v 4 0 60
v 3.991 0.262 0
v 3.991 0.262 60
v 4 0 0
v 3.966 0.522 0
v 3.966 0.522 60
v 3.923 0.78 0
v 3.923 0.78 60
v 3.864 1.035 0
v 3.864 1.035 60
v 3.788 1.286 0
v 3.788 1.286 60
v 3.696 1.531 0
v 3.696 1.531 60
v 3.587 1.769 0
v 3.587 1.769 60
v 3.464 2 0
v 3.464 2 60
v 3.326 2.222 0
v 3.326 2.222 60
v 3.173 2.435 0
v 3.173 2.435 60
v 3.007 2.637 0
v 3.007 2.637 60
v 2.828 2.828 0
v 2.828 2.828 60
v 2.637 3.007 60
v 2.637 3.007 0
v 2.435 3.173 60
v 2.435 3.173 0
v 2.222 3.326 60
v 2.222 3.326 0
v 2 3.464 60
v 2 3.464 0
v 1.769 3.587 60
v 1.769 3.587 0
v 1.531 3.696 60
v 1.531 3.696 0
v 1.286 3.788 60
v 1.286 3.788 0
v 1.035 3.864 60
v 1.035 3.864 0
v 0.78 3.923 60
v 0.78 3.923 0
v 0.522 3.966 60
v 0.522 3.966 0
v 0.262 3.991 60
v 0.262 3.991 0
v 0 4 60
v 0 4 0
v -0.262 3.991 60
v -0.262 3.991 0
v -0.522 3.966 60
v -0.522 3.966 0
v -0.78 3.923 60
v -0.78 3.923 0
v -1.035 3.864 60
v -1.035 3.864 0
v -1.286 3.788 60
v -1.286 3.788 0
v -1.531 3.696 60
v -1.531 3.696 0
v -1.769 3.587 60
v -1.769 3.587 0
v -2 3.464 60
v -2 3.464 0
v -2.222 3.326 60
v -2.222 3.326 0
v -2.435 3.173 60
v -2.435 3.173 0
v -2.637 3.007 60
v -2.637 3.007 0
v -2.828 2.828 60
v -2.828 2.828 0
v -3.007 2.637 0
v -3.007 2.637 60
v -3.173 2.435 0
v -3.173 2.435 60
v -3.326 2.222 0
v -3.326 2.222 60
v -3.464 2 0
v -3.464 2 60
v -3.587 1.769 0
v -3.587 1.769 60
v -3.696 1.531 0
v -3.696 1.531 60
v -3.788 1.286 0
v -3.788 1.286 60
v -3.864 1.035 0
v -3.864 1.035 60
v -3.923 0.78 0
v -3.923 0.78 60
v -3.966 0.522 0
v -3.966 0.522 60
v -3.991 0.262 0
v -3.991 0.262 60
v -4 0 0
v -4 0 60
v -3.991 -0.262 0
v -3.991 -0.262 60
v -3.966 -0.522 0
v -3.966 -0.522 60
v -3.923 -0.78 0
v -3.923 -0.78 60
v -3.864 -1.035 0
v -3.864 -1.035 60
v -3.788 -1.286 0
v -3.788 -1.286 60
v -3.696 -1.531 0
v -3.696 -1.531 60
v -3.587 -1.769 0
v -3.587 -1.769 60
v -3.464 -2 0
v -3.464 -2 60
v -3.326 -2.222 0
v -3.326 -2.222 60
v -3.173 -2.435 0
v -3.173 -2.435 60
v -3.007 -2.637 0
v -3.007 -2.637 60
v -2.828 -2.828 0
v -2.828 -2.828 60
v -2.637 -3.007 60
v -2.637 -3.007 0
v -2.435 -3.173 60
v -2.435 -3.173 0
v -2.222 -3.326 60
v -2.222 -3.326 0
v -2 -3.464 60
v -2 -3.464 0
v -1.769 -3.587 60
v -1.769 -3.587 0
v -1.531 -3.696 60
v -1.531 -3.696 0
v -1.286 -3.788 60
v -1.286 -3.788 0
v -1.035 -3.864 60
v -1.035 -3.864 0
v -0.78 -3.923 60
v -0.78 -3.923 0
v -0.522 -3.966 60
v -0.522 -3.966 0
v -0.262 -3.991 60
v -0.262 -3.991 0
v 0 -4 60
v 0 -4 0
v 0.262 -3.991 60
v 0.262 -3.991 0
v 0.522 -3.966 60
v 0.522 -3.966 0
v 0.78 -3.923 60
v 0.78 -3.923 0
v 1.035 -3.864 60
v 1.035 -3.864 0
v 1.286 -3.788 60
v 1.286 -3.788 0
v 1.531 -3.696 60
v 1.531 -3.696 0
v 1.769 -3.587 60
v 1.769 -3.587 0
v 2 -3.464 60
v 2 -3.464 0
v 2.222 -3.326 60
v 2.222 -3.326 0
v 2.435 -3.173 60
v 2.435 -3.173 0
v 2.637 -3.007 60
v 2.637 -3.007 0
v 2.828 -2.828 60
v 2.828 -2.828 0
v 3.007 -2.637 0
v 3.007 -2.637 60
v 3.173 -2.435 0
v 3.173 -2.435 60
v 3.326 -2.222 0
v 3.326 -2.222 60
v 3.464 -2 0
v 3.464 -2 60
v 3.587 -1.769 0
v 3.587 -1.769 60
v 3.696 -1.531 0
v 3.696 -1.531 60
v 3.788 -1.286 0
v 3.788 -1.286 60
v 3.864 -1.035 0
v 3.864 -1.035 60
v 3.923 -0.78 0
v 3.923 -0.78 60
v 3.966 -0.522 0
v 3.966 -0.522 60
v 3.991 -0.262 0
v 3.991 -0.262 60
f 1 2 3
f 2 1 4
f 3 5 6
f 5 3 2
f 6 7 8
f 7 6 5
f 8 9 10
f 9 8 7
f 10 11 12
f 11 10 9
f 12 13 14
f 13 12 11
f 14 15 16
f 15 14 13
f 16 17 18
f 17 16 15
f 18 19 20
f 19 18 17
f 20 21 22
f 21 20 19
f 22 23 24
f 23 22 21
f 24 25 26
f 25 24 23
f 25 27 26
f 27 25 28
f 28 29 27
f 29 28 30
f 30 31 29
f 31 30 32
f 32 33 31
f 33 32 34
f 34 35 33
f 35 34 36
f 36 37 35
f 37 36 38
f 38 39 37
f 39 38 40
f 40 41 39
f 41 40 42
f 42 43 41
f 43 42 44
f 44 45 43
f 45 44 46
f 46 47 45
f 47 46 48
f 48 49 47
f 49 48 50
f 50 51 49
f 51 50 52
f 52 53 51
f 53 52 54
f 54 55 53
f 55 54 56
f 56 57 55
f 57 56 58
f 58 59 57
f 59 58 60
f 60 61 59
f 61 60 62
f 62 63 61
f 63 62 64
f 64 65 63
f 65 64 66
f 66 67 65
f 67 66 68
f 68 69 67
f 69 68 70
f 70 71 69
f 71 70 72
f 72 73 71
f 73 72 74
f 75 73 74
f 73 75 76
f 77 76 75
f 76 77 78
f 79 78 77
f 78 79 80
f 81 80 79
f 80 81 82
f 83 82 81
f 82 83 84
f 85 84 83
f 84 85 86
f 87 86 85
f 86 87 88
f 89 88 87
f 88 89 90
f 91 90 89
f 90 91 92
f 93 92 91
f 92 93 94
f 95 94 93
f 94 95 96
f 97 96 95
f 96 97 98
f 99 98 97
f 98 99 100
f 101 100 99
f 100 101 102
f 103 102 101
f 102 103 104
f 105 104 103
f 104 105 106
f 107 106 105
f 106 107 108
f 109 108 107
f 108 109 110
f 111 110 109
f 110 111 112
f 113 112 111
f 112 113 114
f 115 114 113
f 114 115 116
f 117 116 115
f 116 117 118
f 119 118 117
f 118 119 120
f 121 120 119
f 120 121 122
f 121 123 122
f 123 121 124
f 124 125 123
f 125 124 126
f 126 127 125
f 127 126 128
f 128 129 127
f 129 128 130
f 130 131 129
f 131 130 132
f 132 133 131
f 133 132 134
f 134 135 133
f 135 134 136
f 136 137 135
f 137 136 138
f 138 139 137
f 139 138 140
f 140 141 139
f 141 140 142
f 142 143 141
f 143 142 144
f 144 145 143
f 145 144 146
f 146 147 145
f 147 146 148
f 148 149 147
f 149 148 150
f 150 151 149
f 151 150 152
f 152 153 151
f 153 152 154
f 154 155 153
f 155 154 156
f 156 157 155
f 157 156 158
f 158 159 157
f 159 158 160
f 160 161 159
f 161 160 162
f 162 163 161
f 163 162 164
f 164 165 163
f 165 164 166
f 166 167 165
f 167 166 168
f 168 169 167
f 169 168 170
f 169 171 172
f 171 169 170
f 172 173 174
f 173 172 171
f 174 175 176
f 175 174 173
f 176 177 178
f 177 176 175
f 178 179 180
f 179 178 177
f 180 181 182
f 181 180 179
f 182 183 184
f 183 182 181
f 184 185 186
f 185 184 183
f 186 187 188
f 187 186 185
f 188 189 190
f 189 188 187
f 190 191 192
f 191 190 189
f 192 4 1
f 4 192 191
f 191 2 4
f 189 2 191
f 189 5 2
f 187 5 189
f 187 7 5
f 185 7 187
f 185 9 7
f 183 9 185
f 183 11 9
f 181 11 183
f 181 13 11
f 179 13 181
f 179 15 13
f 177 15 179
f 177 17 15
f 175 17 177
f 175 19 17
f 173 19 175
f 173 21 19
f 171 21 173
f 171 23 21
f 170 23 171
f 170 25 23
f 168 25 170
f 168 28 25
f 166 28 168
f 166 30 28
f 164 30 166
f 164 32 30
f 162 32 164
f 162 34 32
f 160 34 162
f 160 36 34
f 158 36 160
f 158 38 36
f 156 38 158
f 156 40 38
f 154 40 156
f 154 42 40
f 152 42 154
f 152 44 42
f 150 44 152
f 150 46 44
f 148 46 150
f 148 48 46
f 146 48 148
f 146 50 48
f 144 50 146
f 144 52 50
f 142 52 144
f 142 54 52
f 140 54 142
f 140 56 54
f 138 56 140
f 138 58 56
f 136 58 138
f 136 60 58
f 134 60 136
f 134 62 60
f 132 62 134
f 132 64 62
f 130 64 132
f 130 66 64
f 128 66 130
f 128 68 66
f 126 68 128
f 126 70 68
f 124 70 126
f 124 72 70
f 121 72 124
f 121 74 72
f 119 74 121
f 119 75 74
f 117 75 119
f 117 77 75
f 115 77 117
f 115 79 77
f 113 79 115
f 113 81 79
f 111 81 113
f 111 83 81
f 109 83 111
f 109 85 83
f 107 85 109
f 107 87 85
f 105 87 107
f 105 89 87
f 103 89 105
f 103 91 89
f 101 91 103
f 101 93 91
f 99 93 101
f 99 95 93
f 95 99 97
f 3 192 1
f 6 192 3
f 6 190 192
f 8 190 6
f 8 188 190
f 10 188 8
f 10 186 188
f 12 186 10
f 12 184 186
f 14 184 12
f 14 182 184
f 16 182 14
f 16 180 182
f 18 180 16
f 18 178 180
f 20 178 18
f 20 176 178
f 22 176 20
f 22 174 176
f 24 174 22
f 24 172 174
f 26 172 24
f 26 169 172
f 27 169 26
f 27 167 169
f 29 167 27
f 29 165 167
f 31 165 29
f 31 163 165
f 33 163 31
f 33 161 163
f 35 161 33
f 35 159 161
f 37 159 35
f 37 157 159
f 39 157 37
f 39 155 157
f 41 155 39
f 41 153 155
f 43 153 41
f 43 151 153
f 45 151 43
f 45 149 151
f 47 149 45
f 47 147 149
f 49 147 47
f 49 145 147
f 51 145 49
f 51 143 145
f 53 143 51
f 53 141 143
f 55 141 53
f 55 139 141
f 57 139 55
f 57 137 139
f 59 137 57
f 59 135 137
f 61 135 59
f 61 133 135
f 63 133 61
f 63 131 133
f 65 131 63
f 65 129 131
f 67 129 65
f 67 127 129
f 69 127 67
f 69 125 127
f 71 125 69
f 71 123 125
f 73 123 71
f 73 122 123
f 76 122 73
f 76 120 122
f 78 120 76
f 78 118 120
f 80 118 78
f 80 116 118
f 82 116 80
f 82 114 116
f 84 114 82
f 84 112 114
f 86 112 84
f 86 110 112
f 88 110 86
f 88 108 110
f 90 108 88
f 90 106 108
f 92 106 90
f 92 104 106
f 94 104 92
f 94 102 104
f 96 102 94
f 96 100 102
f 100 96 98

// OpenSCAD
// Auto-generated from tests/data/feature_fixtures_manifest.json
// fixture: cylinder_narrow_tall
// fixture_type: cylinder
// description: Narrow tall cylinder (d=8, h=60) for high-aspect-ratio revolve stress testing.
$fn = 96;

diameter = 8.000000;
height = 60.000000;

cylinder(h=height, d=diameter, center=false);
